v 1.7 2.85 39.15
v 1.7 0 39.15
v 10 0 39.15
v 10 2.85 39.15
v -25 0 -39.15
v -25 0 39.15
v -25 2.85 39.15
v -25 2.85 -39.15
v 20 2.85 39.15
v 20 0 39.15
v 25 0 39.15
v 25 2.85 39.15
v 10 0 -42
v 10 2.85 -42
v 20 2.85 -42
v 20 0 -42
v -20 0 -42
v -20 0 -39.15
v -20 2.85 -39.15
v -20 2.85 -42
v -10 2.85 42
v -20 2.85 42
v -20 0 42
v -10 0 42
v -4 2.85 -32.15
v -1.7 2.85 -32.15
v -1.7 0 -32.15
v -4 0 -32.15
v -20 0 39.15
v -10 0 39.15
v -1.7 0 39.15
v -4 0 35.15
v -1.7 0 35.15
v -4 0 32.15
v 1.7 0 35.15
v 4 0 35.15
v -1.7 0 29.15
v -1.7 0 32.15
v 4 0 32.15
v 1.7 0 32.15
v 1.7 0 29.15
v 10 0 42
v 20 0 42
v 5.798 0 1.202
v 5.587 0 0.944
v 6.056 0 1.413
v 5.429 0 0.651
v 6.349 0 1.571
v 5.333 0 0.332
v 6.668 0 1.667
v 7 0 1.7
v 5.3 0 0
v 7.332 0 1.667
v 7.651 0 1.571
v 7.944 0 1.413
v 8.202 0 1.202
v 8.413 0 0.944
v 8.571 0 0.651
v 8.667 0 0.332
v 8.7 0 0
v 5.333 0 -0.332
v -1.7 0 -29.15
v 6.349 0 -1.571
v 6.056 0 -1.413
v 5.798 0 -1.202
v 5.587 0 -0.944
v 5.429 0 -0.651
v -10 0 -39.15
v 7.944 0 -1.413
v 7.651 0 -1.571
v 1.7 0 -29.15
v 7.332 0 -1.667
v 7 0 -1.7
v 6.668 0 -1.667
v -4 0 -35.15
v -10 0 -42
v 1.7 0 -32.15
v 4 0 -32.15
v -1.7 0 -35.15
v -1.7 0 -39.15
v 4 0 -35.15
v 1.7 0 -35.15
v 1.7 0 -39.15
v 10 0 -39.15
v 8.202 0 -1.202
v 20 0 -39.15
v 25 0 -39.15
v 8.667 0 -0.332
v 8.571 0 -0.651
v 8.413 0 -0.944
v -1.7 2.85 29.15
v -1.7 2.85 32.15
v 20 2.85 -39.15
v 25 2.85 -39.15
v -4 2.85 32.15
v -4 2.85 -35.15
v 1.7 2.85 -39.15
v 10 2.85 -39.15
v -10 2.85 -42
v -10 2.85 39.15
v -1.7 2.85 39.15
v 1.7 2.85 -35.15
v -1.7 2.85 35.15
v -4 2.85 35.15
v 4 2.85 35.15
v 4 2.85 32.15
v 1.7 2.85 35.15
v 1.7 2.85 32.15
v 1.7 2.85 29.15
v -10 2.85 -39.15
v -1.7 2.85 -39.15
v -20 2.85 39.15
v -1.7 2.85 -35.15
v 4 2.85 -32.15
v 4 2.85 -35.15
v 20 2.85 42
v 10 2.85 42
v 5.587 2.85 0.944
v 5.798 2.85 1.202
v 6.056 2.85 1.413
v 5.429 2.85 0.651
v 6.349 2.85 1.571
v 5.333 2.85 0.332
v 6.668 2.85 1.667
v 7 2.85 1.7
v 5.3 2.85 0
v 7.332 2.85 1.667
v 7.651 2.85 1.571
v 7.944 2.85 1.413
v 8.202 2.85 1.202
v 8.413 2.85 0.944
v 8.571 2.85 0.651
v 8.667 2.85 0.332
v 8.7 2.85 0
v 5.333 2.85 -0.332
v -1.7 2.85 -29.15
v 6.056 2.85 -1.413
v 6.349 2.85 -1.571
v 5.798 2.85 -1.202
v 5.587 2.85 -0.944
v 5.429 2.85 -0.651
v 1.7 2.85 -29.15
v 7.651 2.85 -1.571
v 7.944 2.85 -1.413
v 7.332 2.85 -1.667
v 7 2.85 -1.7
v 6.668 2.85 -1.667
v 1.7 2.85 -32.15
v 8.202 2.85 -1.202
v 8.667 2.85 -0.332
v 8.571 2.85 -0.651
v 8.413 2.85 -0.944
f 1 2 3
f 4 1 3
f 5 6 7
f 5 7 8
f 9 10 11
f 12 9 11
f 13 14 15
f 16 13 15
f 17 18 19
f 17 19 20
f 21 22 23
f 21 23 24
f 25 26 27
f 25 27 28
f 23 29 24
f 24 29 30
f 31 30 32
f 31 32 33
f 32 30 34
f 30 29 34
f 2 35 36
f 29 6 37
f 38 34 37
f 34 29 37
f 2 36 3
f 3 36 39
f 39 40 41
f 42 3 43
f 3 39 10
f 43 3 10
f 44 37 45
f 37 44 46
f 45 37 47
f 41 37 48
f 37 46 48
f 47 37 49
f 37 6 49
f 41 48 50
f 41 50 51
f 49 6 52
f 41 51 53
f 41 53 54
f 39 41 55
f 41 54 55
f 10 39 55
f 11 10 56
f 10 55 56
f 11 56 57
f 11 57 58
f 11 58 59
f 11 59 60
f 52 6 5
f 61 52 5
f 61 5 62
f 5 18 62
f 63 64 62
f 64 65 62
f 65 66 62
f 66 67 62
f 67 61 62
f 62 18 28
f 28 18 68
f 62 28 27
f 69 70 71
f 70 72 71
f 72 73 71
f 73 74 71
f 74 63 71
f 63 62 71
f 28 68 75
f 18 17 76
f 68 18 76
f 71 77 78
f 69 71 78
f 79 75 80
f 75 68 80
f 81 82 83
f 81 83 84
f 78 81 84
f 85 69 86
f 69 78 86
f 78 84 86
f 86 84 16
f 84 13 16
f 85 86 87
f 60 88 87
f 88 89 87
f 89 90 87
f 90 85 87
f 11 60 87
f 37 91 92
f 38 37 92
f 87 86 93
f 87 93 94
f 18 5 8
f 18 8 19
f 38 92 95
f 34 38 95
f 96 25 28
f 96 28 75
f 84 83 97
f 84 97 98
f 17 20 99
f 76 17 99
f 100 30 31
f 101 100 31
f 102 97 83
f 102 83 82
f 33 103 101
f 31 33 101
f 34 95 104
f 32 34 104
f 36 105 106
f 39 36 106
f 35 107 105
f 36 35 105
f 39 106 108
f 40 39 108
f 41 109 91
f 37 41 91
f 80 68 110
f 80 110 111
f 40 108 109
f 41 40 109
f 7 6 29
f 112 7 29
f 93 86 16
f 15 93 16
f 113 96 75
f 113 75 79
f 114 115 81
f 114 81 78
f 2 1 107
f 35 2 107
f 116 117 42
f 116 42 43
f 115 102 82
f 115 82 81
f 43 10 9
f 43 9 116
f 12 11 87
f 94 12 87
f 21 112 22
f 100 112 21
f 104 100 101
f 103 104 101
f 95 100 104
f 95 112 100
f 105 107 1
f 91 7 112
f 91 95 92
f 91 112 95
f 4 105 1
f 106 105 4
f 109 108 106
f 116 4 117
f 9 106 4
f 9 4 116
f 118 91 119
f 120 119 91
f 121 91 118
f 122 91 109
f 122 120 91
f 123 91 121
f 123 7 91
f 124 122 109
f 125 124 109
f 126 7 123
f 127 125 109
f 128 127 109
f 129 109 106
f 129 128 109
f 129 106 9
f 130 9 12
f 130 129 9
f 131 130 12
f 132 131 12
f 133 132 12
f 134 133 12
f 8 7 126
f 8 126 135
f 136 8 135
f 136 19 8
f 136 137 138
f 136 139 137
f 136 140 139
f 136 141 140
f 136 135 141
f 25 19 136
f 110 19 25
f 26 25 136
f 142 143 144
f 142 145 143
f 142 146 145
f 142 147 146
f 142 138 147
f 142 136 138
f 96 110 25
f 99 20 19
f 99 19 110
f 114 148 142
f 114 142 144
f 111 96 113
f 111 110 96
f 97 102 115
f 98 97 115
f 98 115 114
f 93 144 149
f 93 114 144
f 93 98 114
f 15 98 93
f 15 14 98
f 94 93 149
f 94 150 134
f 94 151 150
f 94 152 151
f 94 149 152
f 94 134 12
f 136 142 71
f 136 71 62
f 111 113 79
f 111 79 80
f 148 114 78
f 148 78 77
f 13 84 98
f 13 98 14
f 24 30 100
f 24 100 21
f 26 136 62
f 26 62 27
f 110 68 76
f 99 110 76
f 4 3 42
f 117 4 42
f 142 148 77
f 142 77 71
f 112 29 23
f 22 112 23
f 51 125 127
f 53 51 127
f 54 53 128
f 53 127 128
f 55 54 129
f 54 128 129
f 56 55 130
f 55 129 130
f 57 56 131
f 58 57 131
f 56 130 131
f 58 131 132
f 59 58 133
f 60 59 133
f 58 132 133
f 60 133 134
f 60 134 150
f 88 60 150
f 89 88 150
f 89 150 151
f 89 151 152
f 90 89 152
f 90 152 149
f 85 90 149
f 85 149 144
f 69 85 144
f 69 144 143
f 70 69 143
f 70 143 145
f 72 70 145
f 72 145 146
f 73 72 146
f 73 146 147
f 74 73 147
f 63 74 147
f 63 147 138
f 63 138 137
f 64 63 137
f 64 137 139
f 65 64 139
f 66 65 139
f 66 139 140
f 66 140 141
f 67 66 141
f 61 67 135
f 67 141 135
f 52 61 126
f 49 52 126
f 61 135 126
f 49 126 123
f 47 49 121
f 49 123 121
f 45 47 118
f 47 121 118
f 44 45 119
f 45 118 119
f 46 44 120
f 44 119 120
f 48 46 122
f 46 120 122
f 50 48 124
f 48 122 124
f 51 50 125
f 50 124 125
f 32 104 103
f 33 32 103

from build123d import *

# Parameters (mm, degrees)
SKETCH1_W           = 50
SKETCH1_H           = 78.3
BOSS_EXTRUDE1_DEPTH = 2.85
SKETCH2_R           = 1.7
CUT_EXTRUDE1_DEPTH  = 47.53863986
CUT_EXTRUDE2_DEPTH  = 47.53863986
SKETCH4_W           = 10
SKETCH4_H           = 2.85
BOSS_EXTRUDE2_DEPTH = 2.85


with BuildPart() as part:
    # Sketch1 → Boss-Extrude1 (new body)
    with BuildSketch(Plane(origin=(0, 0, 0), x_dir=(1, 0, 0), z_dir=(0, 1, 0))):
        Rectangle(SKETCH1_W, SKETCH1_H)
    extrude(amount=BOSS_EXTRUDE1_DEPTH)

    # Sketch2 → Cut-Extrude1 (cut, through all)
    with BuildSketch(Plane(origin=(0, 2.85, 0), x_dir=(1, 0, 0), z_dir=(0, 1, 0))):
        with Locations(Location((7, 0, 0), (0, 0, 270))):
            Circle(SKETCH2_R)
    extrude(amount=-CUT_EXTRUDE1_DEPTH, mode=Mode.SUBTRACT)

    # Sketch3 → Cut-Extrude2 (cut, through all)
    with BuildSketch(Plane(origin=(0, 2.85, 0), x_dir=(1, 0, 0), z_dir=(0, 1, 0))):
        Polygon((-4, 35.15), (-1.7, 35.15), (-1.7, 39.15), (1.7, 39.15), (1.7, 35.15), (4, 35.15), (4, 32.15), (1.7, 32.15), (1.7, 29.15), (-1.7, 29.15), (-1.7, 32.15), (-4, 32.15), align=None)
    cut_extrude2 = extrude(amount=-CUT_EXTRUDE2_DEPTH, mode=Mode.SUBTRACT)

    # Sketch4 → Boss-Extrude2 (add)
    with BuildSketch(Plane(origin=(0, 2.85, 0), x_dir=(1, 0, 0), z_dir=(0, 1, 0))):
        with Locations((-15, 40.575)):
            Rectangle(SKETCH4_W, SKETCH4_H)
        with Locations((15, 40.575)):
            Rectangle(SKETCH4_W, SKETCH4_H)
    boss_extrude2 = extrude(amount=-BOSS_EXTRUDE2_DEPTH)

    # Mirror1: Cut-Extrude2, Boss-Extrude2 across plane
    add(cut_extrude2.mirror(Plane.XY), mode=Mode.SUBTRACT)
    add(boss_extrude2.mirror(Plane.XY))


solid = part.part
